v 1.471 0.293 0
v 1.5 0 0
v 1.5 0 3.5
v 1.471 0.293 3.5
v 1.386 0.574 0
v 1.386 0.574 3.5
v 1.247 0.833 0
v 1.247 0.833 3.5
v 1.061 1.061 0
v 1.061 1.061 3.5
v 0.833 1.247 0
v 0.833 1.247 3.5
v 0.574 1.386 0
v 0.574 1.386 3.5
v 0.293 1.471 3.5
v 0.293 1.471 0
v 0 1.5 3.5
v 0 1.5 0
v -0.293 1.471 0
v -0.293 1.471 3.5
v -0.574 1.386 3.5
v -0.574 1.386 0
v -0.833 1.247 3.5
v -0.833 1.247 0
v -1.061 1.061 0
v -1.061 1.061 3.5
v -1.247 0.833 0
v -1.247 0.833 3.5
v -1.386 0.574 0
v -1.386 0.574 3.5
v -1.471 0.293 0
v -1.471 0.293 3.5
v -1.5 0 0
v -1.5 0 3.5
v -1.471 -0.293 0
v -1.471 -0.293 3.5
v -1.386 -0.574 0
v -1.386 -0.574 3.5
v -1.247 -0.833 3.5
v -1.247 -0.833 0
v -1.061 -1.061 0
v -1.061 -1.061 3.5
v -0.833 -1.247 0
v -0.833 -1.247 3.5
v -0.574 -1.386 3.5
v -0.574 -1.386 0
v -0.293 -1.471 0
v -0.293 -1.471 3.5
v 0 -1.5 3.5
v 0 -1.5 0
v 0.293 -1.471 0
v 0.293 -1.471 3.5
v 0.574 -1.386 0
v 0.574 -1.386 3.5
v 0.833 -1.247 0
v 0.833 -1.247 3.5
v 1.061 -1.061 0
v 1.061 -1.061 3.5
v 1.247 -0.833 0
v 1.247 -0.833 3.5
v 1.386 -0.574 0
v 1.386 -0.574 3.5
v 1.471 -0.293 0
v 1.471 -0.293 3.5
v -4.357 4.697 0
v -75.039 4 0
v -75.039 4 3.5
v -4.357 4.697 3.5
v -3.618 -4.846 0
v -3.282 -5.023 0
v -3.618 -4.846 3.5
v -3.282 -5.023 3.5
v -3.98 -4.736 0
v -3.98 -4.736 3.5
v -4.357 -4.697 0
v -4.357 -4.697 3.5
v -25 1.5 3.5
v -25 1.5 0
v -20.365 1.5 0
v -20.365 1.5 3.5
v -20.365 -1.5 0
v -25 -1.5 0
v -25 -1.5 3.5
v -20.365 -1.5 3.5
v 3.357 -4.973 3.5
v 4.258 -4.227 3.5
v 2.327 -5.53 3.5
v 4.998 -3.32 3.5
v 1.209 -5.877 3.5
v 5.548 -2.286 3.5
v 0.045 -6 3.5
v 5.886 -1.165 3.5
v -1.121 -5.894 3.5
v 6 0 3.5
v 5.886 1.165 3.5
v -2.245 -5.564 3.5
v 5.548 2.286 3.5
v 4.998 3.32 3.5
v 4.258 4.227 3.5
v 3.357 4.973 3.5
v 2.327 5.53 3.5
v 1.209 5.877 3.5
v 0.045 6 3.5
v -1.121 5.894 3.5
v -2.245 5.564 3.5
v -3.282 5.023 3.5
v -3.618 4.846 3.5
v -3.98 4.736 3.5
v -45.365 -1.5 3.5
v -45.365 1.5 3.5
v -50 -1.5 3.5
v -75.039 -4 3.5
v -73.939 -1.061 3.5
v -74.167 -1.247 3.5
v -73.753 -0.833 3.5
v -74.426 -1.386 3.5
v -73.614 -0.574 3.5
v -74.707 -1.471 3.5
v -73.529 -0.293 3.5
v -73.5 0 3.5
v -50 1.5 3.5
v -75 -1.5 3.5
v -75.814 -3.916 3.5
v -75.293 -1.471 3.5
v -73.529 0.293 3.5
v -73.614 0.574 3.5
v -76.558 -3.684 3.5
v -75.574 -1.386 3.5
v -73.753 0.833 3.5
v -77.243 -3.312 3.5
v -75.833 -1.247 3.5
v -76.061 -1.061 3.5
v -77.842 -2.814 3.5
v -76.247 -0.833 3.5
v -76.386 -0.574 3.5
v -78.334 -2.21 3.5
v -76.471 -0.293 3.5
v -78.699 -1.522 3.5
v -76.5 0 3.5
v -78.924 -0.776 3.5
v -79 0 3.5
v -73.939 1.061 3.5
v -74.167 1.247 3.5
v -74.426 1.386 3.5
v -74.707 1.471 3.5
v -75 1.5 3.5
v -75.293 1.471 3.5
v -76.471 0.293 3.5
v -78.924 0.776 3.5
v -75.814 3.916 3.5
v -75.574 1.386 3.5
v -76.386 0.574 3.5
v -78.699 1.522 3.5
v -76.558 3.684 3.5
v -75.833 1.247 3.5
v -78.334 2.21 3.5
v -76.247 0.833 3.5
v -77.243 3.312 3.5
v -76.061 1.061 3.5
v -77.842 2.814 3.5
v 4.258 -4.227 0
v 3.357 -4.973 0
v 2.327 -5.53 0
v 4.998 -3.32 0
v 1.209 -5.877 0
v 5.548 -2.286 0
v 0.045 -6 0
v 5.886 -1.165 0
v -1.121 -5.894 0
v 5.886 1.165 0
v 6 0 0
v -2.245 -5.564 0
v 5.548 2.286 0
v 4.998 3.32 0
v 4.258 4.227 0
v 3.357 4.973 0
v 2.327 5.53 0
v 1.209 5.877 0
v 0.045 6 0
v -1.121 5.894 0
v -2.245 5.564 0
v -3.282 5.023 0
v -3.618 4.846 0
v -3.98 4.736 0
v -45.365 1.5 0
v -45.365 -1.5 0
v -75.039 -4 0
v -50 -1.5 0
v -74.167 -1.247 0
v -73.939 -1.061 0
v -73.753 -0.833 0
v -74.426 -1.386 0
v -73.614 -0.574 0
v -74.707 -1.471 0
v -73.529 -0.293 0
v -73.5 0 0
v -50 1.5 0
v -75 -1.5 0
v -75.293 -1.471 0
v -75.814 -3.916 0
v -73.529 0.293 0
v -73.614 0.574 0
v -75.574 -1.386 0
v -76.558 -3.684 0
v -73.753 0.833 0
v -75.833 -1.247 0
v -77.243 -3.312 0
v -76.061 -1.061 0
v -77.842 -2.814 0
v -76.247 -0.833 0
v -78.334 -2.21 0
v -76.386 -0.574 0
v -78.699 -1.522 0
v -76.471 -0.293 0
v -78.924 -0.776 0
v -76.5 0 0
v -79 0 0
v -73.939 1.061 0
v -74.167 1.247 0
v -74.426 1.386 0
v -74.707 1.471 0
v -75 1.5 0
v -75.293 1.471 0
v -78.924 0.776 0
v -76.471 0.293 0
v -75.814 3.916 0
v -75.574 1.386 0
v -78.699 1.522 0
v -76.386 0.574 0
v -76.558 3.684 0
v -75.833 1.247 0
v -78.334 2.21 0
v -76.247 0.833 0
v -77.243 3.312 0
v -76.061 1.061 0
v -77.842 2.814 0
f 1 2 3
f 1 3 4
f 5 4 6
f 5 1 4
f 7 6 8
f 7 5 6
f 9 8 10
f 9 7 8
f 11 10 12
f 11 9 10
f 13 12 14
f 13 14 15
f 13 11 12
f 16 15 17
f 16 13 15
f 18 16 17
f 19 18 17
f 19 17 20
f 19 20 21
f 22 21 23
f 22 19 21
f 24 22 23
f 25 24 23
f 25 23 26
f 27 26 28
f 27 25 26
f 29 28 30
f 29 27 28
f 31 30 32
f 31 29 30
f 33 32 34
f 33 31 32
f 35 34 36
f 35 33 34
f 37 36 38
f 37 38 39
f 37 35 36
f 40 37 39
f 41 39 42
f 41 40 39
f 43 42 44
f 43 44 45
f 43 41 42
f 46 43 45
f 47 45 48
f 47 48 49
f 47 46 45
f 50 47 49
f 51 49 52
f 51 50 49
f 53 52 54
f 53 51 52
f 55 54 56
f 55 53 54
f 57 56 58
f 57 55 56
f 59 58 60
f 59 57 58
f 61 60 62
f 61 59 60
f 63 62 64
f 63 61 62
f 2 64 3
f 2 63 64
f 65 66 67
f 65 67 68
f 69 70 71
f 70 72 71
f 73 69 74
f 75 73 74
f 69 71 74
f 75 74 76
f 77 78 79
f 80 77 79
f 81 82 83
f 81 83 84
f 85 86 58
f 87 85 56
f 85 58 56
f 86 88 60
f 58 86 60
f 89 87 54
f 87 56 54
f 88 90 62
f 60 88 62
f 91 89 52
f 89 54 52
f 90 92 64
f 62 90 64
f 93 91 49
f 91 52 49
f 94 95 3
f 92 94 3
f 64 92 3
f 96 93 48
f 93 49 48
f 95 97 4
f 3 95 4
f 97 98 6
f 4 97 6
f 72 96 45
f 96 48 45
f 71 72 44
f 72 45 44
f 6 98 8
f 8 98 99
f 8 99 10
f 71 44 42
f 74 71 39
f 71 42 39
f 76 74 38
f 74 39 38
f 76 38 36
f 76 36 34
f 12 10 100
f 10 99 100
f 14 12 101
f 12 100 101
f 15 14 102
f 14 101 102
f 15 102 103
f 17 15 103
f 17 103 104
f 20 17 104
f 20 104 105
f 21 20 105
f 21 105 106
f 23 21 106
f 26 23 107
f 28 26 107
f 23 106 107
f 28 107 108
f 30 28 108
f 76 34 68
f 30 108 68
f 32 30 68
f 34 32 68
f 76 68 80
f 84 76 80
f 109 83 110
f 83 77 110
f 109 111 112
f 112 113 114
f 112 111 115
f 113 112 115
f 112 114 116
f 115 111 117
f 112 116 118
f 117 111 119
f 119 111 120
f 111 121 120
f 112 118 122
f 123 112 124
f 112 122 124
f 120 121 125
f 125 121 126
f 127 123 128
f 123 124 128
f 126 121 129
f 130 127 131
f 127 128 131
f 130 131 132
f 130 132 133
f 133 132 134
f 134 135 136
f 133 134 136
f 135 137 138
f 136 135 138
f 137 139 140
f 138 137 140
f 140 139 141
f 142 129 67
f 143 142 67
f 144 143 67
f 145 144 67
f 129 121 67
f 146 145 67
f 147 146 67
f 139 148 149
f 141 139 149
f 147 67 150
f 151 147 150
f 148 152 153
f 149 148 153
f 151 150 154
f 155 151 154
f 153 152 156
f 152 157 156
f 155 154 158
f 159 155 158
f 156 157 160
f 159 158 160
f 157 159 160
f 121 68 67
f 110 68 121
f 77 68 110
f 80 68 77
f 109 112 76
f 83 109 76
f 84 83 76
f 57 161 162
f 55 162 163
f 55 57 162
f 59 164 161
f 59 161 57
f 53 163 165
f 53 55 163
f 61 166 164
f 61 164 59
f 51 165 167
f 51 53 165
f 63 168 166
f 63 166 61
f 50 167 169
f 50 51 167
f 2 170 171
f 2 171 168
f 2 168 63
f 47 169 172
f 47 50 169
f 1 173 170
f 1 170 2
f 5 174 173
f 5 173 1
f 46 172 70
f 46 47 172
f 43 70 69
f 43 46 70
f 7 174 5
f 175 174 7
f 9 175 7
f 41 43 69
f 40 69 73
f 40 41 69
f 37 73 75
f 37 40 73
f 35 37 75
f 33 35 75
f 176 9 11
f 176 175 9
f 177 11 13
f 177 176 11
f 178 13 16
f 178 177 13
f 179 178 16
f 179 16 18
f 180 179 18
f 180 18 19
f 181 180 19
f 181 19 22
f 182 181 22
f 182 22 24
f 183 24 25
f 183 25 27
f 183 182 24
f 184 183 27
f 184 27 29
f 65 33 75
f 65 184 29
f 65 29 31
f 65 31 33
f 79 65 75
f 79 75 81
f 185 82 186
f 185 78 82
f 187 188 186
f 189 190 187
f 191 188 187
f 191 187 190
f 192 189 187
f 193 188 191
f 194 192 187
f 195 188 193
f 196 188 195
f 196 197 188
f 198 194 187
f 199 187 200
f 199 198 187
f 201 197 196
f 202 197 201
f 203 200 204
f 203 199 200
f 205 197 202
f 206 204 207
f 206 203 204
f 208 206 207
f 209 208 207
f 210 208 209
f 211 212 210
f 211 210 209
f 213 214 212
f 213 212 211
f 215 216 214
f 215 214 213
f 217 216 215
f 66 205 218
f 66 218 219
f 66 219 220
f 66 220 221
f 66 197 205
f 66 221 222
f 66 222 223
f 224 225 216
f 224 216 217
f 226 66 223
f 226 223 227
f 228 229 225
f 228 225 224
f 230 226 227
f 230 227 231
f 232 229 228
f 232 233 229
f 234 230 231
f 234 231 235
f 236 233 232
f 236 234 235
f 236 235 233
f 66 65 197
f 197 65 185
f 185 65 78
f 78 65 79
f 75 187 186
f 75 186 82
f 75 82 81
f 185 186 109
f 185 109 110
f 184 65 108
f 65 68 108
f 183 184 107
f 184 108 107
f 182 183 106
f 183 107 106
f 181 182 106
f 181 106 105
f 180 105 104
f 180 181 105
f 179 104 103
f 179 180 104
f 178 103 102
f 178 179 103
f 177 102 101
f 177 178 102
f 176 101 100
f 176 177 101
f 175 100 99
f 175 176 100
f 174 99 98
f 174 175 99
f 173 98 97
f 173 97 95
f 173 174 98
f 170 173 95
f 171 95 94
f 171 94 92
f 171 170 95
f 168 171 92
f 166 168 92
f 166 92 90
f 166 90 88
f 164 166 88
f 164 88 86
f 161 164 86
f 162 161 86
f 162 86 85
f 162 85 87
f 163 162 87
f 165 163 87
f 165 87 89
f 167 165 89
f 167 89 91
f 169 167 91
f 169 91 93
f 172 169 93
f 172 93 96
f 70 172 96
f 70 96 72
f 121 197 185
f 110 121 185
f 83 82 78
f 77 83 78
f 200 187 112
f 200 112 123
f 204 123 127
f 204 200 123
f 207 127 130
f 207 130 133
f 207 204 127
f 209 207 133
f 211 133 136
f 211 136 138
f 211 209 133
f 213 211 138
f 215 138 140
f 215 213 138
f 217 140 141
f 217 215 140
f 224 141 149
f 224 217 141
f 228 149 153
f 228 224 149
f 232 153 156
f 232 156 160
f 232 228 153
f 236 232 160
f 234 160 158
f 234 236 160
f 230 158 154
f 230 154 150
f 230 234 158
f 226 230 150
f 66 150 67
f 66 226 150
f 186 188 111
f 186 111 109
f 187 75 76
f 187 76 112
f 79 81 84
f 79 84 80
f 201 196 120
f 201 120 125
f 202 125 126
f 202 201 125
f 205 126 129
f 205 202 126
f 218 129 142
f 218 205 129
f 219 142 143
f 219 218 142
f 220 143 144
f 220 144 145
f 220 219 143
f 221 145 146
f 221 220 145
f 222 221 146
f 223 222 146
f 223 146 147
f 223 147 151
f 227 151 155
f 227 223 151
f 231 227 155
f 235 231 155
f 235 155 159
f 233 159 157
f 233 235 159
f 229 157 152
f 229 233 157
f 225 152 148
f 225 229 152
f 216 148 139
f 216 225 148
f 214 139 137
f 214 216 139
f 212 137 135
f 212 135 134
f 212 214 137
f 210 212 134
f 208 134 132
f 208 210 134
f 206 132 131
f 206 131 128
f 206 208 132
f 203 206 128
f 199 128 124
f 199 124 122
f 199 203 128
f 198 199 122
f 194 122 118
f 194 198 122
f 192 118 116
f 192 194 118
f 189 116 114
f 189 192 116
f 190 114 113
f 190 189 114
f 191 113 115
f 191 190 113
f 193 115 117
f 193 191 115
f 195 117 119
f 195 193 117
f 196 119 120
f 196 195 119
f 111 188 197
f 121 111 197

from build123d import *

# Parameters (mm, degrees)
SKETCH1_R           = 1.5
SKETCH1_W           = 4.635083662
SKETCH1_H           = 3
BOSS_EXTRUDE1_DEPTH = 3.5
FILLET1_R           = 2


with BuildPart() as part:
    # Sketch1 → Boss-Extrude1 (new body)
    with BuildSketch(Plane.XY):
        with BuildLine():
            Line((-75.039443802, 3.999805519), (-3.725751189, 4.703060501))
            ThreePointArc((-3.725751189, 4.703060501), (6, 0), (-3.725751189, -4.703060501))
            Line((-3.725751189, -4.703060501), (-75.039443802, -3.999805519))
            ThreePointArc((-75.039443802, -3.999805519), (-79, 0), (-75.039443802, 3.999805519))
        make_face()
        with Locations((-75, 0)):
            Circle(SKETCH1_R, mode=Mode.SUBTRACT)
        Circle(SKETCH1_R, mode=Mode.SUBTRACT)
        with Locations((-47.682458169, 0)):
            Rectangle(SKETCH1_W, SKETCH1_H, mode=Mode.SUBTRACT)
        with Locations((-22.682458169, 0)):
            Rectangle(SKETCH1_W, SKETCH1_H, mode=Mode.SUBTRACT)
    extrude(amount=BOSS_EXTRUDE1_DEPTH)

    # Fillet1
    fillet1_edges = [part.edges().sort_by_distance(p)[0] for p in [
        (-3.725751189, 4.703060501, 1.75),
        (-3.725751189, -4.703060501, 1.75),
    ]]
    fillet(fillet1_edges, radius=FILLET1_R)


solid = part.part
